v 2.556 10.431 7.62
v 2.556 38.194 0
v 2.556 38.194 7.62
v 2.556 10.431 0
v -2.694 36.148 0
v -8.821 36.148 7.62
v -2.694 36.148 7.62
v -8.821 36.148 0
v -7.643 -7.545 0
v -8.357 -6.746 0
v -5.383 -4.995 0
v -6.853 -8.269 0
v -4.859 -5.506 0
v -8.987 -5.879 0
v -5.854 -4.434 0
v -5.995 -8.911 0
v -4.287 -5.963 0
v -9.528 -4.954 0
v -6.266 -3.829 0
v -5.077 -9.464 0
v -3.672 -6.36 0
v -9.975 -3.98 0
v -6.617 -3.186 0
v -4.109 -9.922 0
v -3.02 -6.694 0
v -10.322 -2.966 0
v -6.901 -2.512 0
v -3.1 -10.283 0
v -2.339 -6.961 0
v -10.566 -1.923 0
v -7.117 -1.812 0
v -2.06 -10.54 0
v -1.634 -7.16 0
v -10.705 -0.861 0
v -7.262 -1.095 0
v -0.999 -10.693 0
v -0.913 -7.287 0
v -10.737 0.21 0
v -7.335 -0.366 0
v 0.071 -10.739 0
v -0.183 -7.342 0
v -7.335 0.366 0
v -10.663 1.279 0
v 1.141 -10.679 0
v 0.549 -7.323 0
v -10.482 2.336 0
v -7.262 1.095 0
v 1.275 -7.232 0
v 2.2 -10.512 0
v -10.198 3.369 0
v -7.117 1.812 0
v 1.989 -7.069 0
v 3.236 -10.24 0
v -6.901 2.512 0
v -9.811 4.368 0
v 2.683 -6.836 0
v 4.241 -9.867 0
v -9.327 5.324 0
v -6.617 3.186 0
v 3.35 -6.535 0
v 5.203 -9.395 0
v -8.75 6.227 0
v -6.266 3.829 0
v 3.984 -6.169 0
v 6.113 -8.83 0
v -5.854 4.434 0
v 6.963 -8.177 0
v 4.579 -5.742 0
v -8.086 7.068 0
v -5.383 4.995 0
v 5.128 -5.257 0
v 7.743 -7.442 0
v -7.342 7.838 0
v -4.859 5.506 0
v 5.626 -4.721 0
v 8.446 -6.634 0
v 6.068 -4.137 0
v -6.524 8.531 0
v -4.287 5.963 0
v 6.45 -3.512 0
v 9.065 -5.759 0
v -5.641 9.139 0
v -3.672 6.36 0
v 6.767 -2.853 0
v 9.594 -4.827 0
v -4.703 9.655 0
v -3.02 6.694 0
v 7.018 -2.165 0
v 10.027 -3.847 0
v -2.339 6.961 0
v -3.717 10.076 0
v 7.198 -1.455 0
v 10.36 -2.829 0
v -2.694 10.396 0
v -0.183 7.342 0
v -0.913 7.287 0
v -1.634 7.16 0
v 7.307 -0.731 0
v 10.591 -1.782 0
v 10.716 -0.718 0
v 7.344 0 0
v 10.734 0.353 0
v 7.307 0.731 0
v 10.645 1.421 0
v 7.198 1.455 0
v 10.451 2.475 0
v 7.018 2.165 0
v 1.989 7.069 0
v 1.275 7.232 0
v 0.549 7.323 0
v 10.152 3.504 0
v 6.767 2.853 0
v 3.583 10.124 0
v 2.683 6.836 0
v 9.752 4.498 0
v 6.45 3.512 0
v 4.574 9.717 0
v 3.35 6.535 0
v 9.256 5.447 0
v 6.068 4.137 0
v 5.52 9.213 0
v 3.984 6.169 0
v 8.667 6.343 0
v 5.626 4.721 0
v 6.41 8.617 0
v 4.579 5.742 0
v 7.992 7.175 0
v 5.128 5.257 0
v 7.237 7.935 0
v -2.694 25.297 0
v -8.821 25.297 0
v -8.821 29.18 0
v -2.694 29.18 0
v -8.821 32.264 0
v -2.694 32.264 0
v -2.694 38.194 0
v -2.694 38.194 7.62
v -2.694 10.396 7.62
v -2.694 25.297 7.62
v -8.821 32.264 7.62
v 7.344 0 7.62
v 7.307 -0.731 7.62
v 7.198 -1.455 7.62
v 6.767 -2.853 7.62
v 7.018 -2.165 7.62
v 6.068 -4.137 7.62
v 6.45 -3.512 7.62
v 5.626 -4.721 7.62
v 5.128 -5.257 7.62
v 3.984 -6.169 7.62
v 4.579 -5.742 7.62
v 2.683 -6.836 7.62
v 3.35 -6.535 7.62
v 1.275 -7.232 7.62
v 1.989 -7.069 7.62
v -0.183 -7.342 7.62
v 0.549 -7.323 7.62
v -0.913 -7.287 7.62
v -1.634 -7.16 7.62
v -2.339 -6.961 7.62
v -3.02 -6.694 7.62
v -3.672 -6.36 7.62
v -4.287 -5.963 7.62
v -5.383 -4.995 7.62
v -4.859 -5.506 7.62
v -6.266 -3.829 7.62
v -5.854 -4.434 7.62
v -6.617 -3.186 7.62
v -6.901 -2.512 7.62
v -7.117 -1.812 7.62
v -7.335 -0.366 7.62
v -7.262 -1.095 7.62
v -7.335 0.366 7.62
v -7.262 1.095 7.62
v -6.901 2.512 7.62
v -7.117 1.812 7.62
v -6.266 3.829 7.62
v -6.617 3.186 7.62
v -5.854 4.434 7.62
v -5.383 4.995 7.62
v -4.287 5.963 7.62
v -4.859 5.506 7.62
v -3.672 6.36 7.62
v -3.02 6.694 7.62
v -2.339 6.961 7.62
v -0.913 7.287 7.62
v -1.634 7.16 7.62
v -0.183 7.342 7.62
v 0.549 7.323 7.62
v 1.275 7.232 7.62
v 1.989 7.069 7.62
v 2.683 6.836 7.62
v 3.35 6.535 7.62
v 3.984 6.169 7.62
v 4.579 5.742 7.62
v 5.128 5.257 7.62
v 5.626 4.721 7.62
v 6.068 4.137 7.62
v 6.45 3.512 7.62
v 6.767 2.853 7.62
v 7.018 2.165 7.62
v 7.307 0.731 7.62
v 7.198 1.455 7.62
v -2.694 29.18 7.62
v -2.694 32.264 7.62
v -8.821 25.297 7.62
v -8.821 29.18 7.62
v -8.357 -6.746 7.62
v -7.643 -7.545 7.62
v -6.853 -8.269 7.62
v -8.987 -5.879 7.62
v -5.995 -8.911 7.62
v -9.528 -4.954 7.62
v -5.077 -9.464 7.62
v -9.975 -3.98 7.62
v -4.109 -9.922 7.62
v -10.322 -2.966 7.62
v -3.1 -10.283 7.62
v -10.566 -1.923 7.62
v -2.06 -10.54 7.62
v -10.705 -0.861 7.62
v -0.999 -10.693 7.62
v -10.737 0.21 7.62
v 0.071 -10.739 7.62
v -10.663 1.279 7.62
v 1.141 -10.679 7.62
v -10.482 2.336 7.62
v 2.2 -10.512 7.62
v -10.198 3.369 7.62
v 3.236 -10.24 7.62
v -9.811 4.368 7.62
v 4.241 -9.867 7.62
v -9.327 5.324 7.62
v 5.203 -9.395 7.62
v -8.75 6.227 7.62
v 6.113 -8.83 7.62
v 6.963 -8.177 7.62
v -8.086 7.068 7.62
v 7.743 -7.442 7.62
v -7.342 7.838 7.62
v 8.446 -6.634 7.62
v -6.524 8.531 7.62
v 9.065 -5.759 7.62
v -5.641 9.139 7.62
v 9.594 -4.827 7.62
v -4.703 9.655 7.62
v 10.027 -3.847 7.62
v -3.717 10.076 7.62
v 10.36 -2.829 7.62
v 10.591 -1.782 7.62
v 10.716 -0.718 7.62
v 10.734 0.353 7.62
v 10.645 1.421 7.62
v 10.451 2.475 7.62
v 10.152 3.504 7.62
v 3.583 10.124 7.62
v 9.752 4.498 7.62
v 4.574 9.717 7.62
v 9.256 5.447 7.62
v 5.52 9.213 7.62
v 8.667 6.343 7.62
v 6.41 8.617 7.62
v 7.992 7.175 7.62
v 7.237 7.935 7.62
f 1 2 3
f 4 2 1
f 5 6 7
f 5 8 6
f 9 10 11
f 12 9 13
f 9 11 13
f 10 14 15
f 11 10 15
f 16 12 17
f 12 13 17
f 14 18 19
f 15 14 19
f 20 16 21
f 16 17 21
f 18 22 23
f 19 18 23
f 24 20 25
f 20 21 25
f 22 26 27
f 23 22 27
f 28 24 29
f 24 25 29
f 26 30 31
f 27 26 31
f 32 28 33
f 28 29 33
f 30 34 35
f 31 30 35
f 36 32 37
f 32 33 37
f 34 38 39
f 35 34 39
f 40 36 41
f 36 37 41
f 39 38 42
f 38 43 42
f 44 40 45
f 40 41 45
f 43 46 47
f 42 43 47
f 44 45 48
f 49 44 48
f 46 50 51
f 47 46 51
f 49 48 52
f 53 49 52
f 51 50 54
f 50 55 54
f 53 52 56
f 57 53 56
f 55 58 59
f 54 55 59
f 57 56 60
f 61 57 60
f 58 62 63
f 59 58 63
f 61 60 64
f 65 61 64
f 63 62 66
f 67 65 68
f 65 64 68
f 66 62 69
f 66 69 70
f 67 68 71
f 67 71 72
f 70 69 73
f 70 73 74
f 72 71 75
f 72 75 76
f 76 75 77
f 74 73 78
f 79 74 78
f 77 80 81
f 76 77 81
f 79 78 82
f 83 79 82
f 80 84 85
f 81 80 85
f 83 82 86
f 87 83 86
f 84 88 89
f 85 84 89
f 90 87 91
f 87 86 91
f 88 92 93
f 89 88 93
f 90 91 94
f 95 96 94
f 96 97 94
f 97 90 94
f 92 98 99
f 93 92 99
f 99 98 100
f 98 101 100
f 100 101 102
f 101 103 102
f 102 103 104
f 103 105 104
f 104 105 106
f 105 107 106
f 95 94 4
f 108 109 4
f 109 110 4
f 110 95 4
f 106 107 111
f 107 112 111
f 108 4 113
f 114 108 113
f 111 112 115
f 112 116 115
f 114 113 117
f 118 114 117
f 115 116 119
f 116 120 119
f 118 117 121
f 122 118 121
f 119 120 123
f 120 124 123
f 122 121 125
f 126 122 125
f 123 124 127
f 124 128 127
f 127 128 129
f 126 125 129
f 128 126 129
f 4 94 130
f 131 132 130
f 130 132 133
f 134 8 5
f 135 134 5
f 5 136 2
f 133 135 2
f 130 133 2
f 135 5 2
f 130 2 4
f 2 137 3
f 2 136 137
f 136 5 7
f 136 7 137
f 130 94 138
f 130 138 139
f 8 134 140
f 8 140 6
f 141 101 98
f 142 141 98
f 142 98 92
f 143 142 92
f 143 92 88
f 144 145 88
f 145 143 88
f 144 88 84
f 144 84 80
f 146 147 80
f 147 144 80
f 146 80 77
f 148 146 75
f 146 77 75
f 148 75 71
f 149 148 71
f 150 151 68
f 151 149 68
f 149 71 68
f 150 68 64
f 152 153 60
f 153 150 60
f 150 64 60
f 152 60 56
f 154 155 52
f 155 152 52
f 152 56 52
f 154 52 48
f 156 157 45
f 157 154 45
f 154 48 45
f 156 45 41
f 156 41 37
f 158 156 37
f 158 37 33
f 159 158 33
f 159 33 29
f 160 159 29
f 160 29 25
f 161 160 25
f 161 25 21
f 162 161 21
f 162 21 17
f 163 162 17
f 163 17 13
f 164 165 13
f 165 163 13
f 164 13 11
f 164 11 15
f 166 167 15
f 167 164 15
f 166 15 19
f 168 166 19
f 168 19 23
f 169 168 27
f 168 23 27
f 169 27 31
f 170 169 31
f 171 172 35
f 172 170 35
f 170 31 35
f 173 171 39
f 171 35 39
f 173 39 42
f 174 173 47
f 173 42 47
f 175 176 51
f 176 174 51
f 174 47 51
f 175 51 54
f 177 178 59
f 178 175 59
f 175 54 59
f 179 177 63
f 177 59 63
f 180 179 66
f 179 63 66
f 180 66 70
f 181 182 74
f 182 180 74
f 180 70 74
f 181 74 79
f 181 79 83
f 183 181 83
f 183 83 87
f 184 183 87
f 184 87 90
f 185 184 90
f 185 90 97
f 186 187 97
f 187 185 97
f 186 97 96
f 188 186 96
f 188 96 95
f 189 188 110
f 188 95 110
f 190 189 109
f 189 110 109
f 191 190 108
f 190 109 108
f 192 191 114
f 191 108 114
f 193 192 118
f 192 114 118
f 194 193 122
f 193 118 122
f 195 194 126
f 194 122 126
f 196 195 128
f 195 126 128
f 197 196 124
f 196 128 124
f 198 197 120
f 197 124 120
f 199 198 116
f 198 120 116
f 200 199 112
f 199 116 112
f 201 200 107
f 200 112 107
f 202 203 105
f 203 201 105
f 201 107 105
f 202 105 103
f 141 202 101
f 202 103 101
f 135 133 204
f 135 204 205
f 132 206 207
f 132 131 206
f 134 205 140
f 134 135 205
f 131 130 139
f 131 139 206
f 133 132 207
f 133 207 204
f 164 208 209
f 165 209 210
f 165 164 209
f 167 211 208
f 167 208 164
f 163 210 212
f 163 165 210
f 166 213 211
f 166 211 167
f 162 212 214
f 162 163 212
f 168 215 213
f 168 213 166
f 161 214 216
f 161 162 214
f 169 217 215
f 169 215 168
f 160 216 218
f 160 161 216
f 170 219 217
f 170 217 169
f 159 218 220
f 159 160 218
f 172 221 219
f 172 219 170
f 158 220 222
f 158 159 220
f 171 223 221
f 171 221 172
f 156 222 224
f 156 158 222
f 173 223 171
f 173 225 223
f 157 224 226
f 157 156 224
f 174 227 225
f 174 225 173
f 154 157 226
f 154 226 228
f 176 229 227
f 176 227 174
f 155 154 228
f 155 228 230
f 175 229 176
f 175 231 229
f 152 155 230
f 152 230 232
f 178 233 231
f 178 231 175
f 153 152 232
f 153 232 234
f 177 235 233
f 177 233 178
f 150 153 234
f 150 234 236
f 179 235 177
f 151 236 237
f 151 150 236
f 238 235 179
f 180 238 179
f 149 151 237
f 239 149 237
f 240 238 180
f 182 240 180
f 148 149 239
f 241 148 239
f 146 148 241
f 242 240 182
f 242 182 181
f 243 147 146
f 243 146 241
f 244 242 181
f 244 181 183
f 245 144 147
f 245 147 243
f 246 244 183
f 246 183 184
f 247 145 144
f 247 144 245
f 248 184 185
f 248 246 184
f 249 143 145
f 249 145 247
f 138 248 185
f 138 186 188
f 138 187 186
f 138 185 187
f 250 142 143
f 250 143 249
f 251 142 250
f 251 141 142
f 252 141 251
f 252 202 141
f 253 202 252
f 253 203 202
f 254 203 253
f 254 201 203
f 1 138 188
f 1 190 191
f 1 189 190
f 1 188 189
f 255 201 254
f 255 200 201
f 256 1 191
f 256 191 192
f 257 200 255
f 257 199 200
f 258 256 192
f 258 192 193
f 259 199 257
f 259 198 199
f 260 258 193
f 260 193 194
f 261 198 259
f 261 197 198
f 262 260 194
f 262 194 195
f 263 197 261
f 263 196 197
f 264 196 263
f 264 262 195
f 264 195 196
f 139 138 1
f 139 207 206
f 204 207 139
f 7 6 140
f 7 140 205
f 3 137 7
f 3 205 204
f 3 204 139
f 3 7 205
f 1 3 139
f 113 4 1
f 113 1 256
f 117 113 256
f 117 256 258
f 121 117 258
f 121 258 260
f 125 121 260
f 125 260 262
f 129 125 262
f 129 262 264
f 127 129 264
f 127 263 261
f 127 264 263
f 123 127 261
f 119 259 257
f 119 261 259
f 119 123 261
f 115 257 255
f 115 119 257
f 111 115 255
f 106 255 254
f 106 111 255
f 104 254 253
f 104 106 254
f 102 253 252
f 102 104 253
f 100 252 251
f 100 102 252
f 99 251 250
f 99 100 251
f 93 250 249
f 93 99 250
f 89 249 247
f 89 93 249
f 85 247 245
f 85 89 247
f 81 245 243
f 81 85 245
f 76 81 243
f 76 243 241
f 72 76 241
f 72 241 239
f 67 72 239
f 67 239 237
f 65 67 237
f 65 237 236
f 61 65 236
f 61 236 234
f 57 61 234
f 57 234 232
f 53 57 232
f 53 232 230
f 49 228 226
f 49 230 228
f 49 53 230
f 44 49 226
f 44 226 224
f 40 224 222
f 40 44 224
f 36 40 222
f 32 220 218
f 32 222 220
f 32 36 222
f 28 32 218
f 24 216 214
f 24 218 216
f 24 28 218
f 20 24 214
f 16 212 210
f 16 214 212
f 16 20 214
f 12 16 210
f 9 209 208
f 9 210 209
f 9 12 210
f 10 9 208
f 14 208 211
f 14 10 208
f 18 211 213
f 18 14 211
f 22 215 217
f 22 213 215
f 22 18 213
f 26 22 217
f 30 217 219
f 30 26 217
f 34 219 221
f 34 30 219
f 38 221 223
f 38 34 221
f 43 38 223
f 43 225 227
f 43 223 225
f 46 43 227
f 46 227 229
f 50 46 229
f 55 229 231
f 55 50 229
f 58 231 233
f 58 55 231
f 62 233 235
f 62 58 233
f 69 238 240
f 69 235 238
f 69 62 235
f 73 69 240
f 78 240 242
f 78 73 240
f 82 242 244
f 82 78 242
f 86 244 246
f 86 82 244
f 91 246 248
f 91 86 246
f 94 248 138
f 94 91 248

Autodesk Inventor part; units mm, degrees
ref_plane "YZ Plane" through (0, 0, 0) normal (1, 0, 0) x (0, 1, 0)
ref_plane "XZ Plane" through (0, 0, 0) normal (0, 1, 0) x (-1, 0, 0)
ref_plane "XY Plane" through (0, 0, 0) normal (0, 0, 1) x (1, 0, 0)
sketch "Sketch1" plane through (0, 0, 0) normal (0, 0, 1) x (1, 0, 0)
  arc A0 (-2.6945, 10.3961) -> (2.5563, 10.431) centre (0, 0) ccw
  circle A1 centre (0, 0) radius 7.3439
  line L0 (-2.6945, 38.1942) -> (2.5563, 38.1942)
  line L1 (-8.8208, 36.1476) -> (-2.6945, 36.1476)
  line L2 (-2.6945, 32.2644) -> (-8.8208, 32.2644)
  line L3 (-8.8208, 32.2644) -> (-8.8208, 36.1476)
  line L4 (-8.8208, 29.1799) -> (-2.6945, 29.1799)
  line L5 (-2.6945, 25.2966) -> (-8.8208, 25.2966)
  line L6 (-8.8208, 25.2966) -> (-8.8208, 29.1799)
  line L7 (-2.6945, 36.1476) -> (-2.6945, 38.1942)
  line L8 (-2.6945, 29.1799) -> (-2.6945, 32.2644)
  line L9 (-2.6945, 10.3961) -> (-2.6945, 25.2966)
  line L10 (2.5563, 38.1942) -> (2.5563, 10.431)
extrude "Extrusion1" add sketch "Sketch1" along normal blind 7.62
properties part number "Key"
